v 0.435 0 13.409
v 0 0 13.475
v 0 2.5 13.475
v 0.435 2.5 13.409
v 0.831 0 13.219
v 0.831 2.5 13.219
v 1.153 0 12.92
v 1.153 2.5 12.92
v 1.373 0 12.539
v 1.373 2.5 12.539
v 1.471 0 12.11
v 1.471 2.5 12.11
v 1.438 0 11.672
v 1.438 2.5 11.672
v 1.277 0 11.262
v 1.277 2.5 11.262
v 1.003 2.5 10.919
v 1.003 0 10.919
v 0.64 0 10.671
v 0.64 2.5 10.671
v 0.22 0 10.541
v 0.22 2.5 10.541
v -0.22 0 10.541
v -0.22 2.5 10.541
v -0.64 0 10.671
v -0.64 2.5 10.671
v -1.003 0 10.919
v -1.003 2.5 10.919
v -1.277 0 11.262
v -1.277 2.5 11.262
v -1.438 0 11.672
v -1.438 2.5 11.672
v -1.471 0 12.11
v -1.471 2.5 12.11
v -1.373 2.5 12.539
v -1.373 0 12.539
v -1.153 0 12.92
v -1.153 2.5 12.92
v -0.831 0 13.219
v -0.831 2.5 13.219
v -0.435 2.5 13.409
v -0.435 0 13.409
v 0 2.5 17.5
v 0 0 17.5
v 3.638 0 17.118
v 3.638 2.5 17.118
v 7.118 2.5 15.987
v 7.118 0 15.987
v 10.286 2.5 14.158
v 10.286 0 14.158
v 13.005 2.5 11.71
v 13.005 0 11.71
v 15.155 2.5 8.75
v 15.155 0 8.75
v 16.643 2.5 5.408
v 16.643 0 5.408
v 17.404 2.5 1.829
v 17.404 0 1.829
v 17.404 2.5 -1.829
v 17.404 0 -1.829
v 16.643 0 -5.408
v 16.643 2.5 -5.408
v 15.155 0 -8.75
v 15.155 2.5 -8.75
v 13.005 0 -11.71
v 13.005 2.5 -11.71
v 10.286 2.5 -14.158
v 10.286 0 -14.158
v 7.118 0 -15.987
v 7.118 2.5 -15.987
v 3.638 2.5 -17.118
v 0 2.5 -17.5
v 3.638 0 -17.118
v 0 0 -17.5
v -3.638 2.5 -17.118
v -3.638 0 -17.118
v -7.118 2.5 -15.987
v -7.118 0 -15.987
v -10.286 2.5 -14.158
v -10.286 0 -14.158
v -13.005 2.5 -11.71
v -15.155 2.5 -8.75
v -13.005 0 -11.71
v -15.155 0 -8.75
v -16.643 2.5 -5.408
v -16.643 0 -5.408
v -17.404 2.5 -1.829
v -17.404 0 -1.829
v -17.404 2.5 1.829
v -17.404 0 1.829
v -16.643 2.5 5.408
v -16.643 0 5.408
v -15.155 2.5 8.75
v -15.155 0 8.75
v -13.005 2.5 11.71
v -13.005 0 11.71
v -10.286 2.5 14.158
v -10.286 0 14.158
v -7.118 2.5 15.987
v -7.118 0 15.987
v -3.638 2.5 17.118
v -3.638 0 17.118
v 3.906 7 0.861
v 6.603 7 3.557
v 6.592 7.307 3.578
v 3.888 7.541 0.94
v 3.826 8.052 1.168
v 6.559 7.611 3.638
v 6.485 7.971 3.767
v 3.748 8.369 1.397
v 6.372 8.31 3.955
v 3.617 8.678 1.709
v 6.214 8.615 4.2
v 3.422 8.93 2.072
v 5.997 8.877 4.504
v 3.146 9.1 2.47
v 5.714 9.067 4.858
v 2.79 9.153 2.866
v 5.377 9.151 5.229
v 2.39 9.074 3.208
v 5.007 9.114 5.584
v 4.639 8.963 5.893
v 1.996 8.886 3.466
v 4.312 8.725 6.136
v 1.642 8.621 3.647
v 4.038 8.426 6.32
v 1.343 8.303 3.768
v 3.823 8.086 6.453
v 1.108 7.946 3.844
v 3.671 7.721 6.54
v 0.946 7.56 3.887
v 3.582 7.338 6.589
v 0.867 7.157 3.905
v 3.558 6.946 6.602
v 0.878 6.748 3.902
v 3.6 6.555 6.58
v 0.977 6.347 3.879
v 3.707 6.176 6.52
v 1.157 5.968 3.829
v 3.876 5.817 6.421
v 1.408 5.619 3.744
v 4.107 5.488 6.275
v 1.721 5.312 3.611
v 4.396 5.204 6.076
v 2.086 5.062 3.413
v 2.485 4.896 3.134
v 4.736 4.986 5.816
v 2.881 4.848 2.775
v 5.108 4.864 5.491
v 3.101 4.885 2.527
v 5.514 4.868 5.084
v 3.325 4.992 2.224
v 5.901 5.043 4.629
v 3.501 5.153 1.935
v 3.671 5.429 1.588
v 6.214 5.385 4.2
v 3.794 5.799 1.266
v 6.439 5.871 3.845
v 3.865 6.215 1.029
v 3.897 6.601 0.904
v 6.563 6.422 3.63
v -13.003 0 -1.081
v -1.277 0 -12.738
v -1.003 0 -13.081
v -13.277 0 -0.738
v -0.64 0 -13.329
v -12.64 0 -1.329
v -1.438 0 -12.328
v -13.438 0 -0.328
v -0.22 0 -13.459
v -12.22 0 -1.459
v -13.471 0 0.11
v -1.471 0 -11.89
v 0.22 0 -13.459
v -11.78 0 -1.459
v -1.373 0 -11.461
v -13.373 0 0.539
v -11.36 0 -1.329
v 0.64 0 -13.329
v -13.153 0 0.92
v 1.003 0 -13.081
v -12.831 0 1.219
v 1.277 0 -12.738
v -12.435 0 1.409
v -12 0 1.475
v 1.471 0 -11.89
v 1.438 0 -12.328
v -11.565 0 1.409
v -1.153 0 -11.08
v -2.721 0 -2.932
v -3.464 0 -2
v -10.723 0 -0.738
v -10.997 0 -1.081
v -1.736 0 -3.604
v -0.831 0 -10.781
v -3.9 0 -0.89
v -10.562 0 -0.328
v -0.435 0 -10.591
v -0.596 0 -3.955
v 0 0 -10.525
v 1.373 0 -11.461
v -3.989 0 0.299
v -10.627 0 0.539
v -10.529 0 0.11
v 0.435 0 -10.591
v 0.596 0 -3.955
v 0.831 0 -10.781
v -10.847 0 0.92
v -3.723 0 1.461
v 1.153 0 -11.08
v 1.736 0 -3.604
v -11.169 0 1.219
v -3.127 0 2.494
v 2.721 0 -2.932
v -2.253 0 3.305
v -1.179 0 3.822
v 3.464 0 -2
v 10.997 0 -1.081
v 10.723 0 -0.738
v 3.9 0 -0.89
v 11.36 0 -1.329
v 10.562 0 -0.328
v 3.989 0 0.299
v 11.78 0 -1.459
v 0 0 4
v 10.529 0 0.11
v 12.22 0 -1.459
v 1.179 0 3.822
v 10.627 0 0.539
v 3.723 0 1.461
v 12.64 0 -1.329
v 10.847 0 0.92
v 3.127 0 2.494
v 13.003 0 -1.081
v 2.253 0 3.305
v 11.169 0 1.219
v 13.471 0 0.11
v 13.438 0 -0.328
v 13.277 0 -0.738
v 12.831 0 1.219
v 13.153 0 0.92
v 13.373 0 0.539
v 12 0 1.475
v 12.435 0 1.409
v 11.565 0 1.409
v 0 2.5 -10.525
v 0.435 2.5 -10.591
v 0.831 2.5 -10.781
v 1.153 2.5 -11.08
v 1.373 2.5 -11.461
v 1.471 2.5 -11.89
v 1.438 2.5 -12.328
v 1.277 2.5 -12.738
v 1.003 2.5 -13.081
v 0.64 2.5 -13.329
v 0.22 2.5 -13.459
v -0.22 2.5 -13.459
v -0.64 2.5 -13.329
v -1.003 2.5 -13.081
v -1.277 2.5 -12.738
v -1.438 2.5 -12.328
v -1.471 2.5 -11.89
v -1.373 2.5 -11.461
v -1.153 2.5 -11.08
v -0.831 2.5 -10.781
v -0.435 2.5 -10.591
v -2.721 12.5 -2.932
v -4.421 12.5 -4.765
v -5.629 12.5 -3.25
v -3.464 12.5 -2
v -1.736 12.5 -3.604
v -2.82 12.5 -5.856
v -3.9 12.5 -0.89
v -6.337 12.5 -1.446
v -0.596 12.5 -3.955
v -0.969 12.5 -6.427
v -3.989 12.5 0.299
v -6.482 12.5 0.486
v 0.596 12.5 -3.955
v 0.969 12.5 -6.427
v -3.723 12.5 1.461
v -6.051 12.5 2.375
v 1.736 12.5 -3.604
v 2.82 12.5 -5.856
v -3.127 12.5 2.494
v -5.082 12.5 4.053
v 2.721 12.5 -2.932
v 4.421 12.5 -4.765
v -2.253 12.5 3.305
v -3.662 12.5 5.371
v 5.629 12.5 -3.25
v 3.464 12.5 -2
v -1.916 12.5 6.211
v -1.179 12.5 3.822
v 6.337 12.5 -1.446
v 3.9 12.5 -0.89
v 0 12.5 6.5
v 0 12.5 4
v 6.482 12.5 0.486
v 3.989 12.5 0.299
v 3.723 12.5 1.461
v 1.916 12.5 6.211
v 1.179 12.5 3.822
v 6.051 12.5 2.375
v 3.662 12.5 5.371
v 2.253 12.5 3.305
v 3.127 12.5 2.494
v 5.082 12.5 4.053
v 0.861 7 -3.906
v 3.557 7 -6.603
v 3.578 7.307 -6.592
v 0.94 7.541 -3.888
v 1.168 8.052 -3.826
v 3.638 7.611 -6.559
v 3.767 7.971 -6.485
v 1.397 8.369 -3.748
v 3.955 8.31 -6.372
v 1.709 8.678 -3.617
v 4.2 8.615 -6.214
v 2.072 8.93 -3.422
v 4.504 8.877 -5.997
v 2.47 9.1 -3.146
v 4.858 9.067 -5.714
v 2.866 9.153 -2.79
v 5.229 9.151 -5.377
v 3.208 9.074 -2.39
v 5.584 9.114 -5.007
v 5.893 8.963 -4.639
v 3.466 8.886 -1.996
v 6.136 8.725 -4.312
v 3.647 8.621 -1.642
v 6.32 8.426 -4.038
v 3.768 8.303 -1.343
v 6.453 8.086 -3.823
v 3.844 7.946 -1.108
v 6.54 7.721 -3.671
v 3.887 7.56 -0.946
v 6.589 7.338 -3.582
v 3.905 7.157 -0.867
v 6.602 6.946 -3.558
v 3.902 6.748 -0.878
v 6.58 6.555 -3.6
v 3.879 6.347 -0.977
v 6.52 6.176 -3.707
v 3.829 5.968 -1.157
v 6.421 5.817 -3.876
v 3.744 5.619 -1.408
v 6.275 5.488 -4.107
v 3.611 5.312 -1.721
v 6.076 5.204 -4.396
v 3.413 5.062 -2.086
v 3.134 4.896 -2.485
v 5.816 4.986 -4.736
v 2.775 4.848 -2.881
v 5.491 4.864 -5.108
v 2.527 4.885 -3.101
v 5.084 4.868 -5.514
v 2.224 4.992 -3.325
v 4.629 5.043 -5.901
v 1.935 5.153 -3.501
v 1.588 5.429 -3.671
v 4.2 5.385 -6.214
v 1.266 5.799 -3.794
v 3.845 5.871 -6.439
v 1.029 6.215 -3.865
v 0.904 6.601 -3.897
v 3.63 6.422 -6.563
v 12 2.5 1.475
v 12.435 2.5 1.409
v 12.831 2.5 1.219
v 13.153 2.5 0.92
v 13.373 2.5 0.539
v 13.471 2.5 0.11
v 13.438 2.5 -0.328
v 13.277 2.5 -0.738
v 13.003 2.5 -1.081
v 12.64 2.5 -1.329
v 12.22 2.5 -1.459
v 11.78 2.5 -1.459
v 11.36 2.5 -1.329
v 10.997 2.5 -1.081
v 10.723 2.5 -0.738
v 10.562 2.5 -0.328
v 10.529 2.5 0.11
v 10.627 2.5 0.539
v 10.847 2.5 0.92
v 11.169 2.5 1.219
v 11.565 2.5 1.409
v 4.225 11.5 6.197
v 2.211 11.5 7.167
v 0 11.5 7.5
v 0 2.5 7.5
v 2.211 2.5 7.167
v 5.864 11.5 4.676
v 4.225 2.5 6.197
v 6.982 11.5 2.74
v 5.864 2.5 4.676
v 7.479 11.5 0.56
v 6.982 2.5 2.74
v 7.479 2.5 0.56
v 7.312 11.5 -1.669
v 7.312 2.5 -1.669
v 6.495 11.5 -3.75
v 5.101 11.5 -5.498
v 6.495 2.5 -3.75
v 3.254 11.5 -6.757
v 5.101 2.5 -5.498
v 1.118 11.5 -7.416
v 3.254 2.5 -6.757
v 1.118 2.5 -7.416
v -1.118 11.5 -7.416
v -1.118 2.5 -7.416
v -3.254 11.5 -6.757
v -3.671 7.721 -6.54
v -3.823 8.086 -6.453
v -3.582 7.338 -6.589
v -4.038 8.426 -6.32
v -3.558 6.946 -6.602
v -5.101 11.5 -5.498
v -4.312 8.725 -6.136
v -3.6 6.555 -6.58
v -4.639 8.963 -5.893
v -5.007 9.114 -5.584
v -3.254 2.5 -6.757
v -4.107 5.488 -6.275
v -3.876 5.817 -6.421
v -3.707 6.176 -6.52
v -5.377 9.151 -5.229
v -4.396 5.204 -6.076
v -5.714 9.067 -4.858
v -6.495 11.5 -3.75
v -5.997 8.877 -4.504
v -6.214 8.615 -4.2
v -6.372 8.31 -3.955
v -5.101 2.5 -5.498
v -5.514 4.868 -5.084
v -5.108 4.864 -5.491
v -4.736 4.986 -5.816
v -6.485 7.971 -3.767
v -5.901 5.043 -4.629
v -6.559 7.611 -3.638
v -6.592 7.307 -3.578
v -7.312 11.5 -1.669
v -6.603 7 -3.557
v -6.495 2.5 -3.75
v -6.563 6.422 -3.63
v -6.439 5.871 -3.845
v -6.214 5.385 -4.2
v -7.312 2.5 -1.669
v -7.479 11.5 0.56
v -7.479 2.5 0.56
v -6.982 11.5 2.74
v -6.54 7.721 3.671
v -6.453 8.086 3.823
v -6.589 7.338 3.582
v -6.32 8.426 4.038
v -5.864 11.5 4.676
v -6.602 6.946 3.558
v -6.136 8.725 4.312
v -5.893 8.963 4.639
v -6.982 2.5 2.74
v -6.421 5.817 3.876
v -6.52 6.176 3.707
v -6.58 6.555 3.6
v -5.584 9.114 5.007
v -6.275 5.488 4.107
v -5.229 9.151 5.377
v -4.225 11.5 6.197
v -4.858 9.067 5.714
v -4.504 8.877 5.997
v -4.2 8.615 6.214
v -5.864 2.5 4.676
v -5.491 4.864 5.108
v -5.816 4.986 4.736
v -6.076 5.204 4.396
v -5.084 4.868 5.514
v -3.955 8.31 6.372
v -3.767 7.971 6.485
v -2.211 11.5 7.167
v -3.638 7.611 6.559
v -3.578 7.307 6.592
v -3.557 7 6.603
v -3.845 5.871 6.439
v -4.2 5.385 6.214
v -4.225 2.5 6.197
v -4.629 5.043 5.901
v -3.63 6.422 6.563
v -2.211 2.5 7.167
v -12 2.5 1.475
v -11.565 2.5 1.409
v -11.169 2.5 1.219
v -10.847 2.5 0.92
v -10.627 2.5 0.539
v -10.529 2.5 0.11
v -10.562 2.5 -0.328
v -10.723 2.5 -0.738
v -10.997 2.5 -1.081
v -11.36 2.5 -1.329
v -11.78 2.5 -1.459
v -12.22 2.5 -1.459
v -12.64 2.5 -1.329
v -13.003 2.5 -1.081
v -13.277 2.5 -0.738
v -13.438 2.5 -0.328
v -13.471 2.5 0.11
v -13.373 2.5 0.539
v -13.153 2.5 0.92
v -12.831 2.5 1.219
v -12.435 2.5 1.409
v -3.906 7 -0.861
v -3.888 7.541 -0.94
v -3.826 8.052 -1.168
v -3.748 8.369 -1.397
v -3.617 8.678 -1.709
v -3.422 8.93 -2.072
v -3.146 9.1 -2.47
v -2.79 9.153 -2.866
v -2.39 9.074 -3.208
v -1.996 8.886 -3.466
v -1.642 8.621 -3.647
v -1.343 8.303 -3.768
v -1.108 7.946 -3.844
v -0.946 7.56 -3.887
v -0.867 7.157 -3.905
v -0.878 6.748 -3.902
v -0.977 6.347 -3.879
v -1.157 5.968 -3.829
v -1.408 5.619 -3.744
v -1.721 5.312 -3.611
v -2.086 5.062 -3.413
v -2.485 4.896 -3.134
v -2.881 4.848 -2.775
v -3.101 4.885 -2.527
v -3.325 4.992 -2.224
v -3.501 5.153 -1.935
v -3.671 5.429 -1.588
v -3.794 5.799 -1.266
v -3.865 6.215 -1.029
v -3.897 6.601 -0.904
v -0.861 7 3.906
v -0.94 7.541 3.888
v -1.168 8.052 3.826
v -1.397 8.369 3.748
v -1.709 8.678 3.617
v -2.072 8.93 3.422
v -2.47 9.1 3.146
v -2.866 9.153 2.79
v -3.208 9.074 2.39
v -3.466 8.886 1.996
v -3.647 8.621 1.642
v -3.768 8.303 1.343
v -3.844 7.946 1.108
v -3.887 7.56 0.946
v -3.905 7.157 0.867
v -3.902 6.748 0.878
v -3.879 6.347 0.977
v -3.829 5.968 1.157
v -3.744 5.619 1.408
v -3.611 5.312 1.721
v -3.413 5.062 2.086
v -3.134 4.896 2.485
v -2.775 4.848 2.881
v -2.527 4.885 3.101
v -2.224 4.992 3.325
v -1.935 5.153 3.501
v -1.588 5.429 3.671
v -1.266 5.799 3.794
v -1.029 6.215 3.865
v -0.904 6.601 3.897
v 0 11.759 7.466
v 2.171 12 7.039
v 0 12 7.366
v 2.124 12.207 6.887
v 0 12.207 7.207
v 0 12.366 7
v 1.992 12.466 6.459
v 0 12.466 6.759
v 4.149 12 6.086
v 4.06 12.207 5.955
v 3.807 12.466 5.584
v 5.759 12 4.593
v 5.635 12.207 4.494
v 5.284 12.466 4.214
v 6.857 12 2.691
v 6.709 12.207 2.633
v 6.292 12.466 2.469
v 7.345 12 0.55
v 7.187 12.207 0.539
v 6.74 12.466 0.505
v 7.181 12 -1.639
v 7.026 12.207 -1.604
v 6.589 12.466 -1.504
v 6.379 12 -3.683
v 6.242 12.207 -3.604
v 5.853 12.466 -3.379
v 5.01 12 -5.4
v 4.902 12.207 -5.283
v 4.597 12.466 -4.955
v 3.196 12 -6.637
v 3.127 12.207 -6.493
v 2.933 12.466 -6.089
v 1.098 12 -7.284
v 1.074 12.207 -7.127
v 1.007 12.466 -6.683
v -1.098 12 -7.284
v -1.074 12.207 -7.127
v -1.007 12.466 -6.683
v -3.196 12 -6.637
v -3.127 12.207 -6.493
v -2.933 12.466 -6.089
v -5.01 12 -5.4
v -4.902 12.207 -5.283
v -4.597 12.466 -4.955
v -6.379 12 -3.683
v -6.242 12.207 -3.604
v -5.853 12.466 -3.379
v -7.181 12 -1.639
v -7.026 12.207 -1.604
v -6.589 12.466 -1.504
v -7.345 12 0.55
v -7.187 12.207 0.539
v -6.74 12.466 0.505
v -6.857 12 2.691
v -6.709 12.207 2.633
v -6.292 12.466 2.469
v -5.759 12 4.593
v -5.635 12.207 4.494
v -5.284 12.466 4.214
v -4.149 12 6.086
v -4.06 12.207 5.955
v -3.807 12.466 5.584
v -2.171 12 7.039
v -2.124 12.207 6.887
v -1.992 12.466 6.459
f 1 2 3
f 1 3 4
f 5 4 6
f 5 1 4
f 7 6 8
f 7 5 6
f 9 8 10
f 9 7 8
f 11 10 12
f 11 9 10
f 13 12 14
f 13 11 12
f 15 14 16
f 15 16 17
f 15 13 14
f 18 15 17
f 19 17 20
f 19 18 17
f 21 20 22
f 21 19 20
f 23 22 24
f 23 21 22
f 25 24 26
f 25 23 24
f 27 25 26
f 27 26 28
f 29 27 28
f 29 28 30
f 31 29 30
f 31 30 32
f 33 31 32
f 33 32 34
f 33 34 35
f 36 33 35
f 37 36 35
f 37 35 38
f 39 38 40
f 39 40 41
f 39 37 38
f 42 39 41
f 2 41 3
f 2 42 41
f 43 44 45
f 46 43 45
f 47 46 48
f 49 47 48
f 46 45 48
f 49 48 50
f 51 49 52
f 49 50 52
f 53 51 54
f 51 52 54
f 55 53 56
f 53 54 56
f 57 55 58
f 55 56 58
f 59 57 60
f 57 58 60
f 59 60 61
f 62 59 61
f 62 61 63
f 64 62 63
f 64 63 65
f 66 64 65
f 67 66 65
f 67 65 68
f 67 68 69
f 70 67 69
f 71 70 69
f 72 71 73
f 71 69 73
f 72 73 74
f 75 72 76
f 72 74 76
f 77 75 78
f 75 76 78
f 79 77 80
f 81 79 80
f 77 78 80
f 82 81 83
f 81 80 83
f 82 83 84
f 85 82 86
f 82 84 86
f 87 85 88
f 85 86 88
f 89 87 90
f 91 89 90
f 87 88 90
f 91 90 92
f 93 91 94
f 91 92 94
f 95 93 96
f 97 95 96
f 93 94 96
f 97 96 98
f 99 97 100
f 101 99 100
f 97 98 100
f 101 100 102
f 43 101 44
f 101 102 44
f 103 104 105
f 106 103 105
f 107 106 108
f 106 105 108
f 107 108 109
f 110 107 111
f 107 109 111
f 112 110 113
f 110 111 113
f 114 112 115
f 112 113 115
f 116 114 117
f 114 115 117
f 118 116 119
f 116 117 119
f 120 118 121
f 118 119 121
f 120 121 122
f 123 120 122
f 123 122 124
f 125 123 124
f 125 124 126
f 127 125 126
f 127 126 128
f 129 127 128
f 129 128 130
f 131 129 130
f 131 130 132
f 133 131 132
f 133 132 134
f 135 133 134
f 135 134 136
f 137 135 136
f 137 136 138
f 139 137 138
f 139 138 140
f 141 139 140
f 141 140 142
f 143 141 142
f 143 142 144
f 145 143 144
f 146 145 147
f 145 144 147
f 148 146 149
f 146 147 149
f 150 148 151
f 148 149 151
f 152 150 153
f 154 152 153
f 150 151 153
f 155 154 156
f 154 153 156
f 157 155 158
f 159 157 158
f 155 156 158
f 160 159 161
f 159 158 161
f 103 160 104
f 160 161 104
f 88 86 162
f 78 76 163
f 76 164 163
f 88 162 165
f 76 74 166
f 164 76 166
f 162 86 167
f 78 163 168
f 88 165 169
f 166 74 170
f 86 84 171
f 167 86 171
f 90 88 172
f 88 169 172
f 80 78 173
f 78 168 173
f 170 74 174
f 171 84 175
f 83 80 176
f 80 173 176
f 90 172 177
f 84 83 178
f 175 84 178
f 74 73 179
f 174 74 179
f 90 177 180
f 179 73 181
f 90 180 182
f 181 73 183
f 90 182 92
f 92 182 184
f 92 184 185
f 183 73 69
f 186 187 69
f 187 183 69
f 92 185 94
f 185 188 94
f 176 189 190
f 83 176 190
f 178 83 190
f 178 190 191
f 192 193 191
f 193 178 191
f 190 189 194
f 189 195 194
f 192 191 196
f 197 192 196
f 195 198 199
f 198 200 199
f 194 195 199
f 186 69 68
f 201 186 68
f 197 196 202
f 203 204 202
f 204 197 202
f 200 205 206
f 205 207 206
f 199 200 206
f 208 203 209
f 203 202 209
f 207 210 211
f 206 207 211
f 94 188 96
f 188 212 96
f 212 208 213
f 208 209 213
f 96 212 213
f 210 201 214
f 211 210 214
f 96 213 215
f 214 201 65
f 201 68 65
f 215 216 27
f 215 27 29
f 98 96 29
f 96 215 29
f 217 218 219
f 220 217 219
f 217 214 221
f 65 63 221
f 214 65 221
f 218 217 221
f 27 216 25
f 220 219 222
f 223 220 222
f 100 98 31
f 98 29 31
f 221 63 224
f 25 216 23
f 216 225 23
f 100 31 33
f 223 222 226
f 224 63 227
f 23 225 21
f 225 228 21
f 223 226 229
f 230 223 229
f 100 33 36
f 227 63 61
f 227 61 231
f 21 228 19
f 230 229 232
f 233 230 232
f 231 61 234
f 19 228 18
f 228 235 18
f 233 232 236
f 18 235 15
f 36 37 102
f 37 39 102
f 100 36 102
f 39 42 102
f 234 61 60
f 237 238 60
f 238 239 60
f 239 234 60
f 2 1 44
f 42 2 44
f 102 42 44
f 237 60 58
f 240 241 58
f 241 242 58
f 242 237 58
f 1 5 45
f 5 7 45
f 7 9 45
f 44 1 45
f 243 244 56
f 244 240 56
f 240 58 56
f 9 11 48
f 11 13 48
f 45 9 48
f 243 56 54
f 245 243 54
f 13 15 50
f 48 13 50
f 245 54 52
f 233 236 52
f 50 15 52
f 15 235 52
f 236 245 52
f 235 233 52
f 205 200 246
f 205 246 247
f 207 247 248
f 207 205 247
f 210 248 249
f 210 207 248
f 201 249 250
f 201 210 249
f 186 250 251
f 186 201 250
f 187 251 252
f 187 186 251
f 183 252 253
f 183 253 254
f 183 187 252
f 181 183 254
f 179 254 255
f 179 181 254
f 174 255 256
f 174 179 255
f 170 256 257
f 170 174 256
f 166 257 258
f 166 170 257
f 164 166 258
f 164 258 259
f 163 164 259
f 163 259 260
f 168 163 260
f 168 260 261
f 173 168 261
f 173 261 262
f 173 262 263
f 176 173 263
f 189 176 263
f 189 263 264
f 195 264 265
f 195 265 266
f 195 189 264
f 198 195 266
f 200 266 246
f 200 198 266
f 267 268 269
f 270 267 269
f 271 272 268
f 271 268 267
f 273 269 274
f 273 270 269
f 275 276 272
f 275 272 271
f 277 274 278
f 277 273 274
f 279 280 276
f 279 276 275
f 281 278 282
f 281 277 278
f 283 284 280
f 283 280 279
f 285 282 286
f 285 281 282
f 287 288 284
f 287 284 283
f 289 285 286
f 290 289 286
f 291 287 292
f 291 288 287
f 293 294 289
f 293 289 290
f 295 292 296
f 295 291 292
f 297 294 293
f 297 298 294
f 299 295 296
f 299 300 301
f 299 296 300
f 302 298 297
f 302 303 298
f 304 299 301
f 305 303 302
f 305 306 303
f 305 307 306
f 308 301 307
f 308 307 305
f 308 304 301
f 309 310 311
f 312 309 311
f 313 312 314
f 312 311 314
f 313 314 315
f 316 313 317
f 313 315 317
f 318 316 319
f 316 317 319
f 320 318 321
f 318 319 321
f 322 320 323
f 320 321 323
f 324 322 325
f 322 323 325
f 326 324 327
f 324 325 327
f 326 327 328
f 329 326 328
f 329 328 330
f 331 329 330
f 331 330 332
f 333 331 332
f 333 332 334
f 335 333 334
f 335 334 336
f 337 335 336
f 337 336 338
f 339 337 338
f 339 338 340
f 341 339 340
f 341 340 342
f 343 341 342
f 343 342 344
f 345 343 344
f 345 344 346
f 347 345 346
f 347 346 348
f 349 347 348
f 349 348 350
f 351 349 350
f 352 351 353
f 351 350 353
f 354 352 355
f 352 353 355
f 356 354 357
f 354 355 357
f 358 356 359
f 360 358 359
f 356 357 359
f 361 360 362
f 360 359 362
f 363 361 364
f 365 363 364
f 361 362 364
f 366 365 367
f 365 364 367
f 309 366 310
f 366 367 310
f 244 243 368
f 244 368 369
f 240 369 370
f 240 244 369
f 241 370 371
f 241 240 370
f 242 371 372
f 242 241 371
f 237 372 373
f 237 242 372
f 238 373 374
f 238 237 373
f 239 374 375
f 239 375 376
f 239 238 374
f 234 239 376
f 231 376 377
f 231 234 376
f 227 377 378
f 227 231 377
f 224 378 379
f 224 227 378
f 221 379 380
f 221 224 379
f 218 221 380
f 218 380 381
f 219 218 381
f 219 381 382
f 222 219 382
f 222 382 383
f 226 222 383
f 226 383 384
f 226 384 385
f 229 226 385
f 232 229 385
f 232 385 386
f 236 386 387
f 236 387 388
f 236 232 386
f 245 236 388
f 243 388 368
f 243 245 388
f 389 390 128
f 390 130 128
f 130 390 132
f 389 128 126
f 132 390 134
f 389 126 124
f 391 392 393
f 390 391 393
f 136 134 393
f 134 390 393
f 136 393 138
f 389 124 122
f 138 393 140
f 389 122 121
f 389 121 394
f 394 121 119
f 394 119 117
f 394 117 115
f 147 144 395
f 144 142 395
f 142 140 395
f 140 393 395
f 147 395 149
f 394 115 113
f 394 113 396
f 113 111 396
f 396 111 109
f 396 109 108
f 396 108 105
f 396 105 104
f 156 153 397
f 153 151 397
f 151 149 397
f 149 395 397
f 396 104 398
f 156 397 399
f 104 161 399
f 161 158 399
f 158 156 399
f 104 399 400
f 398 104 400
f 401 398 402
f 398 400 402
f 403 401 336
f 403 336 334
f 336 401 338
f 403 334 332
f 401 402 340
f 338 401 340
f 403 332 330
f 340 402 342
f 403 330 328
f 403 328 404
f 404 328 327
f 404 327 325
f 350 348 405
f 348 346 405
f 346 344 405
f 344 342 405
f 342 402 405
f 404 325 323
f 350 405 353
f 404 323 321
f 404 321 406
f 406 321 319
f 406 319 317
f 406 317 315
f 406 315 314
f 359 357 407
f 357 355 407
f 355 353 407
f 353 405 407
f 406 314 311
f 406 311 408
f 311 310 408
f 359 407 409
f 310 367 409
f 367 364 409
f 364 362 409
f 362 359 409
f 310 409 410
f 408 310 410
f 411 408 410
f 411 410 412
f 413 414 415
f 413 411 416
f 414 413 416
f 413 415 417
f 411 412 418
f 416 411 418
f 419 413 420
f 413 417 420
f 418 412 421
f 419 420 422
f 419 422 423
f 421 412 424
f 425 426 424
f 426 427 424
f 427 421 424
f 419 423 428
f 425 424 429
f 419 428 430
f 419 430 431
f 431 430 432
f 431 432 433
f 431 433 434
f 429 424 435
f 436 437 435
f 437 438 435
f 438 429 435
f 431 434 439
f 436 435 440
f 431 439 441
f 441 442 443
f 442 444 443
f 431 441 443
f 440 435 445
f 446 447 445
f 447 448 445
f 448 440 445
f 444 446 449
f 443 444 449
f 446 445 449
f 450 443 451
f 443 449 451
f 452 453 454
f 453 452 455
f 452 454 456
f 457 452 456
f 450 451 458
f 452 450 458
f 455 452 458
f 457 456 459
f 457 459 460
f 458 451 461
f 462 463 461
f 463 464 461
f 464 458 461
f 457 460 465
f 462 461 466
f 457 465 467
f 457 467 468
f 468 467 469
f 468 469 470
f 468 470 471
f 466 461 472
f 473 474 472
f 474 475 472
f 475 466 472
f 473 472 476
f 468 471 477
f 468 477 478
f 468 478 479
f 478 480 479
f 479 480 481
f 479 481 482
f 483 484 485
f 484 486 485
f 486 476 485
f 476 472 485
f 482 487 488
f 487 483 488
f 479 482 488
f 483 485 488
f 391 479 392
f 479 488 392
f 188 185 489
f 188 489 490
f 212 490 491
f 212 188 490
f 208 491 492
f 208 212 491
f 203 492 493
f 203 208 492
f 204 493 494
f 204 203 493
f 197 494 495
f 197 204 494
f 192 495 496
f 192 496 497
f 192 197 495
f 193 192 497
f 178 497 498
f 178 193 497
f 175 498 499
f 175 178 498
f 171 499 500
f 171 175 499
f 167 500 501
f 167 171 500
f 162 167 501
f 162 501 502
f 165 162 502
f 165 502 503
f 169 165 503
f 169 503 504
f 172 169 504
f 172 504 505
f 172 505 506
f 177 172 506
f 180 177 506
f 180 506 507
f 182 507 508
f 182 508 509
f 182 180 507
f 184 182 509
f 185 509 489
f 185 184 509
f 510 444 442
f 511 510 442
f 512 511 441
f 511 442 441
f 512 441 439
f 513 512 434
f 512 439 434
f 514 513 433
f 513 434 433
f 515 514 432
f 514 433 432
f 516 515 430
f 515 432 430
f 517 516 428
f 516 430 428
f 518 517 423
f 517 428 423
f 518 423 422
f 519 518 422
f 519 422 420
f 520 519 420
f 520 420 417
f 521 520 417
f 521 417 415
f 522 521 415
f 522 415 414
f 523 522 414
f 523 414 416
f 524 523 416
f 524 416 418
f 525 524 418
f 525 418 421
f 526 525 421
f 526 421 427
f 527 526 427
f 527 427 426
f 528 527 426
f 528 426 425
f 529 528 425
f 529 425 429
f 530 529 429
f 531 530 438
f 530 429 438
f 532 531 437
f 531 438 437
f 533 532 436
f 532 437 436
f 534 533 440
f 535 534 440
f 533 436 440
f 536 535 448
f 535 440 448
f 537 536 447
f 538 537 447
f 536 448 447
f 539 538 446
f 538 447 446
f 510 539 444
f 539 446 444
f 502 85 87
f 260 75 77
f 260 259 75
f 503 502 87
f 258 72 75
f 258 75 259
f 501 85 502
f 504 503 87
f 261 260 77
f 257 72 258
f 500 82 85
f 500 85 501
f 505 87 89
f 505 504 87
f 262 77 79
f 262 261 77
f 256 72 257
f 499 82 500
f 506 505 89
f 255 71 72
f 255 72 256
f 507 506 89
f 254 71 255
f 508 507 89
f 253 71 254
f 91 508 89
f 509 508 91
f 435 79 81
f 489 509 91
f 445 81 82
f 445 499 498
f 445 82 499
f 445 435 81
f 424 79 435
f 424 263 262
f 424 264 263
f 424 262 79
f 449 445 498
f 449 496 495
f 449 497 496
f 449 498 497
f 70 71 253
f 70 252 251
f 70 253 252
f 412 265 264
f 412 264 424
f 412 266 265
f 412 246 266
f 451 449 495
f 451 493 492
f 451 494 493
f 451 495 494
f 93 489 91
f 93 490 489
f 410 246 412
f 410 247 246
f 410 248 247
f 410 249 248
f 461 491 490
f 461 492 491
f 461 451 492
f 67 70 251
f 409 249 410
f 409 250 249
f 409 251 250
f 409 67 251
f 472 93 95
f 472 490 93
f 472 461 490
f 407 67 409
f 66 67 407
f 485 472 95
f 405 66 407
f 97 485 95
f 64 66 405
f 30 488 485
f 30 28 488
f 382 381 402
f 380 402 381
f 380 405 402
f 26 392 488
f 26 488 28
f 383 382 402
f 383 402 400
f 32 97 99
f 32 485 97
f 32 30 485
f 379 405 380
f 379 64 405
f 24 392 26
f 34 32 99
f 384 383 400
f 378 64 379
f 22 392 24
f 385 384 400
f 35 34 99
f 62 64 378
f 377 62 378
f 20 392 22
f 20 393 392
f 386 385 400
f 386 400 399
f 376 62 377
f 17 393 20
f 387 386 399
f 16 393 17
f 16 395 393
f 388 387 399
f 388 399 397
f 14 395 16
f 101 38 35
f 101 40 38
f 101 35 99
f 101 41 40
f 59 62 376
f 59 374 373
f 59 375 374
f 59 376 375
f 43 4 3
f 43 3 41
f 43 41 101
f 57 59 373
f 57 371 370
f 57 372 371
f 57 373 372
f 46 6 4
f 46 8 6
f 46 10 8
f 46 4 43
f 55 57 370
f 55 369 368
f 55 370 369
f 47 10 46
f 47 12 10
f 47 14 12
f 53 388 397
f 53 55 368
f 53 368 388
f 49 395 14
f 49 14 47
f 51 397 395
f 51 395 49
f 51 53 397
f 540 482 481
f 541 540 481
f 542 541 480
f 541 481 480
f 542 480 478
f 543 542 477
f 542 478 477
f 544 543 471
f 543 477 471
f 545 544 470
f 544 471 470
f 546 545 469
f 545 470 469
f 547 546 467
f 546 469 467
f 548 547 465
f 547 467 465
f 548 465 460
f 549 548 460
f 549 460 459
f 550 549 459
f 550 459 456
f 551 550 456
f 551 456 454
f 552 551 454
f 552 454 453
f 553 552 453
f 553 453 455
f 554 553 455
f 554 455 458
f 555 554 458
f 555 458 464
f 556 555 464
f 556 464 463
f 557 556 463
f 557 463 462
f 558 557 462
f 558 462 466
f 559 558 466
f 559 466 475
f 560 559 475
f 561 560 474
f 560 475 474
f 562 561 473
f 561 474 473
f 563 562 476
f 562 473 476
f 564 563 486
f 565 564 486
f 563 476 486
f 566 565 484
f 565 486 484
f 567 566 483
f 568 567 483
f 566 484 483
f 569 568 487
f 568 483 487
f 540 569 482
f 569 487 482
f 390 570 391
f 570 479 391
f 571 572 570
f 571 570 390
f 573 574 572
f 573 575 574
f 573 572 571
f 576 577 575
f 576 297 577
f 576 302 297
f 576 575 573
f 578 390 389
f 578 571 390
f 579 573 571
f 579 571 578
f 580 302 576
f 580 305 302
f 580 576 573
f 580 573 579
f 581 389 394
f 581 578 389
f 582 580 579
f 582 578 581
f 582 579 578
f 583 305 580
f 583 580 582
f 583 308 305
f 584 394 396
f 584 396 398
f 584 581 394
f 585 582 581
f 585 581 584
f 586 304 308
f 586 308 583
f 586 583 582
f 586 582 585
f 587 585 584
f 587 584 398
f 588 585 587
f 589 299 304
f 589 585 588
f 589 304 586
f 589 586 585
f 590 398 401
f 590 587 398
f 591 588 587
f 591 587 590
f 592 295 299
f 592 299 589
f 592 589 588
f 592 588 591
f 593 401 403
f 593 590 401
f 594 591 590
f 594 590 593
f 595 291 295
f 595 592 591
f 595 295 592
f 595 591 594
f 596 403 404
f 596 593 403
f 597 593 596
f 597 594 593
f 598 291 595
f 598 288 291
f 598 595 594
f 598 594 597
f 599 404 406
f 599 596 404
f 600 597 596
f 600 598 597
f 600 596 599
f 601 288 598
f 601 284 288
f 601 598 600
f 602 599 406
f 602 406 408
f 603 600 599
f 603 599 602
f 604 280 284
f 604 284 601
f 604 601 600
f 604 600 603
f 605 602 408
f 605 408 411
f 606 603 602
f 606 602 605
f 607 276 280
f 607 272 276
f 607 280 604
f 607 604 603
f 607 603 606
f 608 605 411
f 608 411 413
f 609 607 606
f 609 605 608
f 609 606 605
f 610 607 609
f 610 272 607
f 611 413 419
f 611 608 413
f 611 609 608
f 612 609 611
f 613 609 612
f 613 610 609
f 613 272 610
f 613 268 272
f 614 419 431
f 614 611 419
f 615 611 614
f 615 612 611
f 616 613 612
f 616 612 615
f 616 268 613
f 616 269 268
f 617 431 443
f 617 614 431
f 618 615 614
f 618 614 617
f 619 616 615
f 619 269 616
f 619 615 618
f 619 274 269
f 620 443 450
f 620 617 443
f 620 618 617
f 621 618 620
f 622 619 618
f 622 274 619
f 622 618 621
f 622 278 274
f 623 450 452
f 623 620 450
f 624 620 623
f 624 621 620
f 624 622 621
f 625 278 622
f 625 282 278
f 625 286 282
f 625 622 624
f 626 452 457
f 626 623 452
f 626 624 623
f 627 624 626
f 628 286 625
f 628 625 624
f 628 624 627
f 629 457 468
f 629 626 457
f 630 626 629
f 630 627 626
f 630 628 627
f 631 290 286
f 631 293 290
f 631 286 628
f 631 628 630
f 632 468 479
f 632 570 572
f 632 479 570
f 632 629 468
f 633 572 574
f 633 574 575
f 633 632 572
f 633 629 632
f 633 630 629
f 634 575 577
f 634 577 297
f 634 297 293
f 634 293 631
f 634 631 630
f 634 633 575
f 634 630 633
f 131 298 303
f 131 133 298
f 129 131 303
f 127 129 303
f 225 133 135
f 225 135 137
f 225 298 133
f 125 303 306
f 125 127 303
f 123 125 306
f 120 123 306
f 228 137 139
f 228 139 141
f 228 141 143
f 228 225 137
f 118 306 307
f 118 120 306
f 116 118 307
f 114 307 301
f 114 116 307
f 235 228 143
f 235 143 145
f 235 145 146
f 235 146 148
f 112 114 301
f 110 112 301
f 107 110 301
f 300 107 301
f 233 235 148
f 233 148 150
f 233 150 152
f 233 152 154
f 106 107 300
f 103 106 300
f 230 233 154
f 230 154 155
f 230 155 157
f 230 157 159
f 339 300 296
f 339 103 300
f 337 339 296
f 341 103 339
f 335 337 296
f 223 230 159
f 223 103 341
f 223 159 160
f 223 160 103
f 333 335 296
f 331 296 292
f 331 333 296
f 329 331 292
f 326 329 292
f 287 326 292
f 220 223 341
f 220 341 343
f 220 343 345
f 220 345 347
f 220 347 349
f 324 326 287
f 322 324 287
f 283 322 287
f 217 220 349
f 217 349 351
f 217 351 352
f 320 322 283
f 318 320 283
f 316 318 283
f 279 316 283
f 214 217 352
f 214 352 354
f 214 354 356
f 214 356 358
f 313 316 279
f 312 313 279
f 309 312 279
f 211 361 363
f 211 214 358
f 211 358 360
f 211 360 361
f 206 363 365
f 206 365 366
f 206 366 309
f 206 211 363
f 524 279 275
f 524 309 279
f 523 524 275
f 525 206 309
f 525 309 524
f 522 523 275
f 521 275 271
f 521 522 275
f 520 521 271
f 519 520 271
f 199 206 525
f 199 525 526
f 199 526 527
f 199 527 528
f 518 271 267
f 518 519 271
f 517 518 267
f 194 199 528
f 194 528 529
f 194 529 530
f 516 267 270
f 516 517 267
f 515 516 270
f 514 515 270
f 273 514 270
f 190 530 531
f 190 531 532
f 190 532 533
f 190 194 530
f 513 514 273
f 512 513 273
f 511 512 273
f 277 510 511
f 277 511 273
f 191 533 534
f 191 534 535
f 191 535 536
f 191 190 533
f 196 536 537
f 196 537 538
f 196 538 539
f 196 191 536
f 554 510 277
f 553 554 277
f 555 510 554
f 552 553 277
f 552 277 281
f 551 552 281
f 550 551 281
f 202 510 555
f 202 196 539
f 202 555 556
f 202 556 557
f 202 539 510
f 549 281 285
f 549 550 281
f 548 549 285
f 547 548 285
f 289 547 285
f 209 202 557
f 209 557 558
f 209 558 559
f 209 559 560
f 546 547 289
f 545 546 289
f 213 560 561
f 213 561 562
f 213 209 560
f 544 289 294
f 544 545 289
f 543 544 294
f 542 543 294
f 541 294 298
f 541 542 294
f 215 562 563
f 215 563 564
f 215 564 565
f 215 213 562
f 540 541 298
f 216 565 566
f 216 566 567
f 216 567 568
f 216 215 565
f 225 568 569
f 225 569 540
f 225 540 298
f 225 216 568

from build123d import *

# Parameters (mm, degrees)
SKETCH2_R           = 17.5
SKETCH2_R_2         = 1.475
SKETCH2_R_3         = 4
BOSS_EXTRUDE1_DEPTH = 2.5
SKETCH3_R           = 7.5
SKETCH3_R_2         = 4
BOSS_EXTRUDE2_DEPTH = 10
FILLET1_R           = 1
SKETCH7_R           = 2.153442821
CUT_EXTRUDE7_DEPTH  = 5
CIRPATTERN2_COUNT   = 4


with BuildPart() as part:
    # Sketch2 → Boss-Extrude1 (new body)
    with BuildSketch(Plane(origin=(0, 0, 0), x_dir=(1, 0, 0), z_dir=(0, 1, 0))):
        with Locations(Location((0, 0, 0), (0, 0, 270))):
            Circle(SKETCH2_R)
        with Locations(Location((-12, 0, 0), (0, 0, 270))):
            Circle(SKETCH2_R_2, mode=Mode.SUBTRACT)
        with Locations(Location((0, -12, 0), (0, 0, 270))):
            Circle(SKETCH2_R_2, mode=Mode.SUBTRACT)
        with Locations(Location((12, 0, 0), (0, 0, 270))):
            Circle(SKETCH2_R_2, mode=Mode.SUBTRACT)
        with Locations(Location((0, 12, 0), (0, 0, 270))):
            Circle(SKETCH2_R_2, mode=Mode.SUBTRACT)
        with Locations(Location((0, 0, 0), (0, 0, 270))):
            Circle(SKETCH2_R_3, mode=Mode.SUBTRACT)
    extrude(amount=BOSS_EXTRUDE1_DEPTH)

    # Sketch3 → Boss-Extrude2 (add)
    with BuildSketch(Plane(origin=(0, 2.5, 0), x_dir=(1, 0, 0), z_dir=(0, 1, 0))):
        with Locations(Location((0, 0, 0), (0, 0, 270))):
            Circle(SKETCH3_R)
        with Locations(Location((0, 0, 0), (0, 0, 270))):
            Circle(SKETCH3_R_2, mode=Mode.SUBTRACT)
    extrude(amount=BOSS_EXTRUDE2_DEPTH)

    # Fillet1
    fillet1_edges = [part.edges().sort_by_distance(p)[0] for p in [
        (0, 12.5, -7.5),
    ]]
    fillet(fillet1_edges, radius=FILLET1_R)

    # Sketch7 → Cut-Extrude7 (cut)
    with BuildSketch(Plane(origin=(5.303300859, 0, 5.303300859), x_dir=(0, -1, 0), z_dir=(0.7071067811865464, 0, 0.7071067811865488))):
        with Locations(Location((-7, 0, 0), (0, 0, 90))):
            Circle(SKETCH7_R)
    cut_extrude7 = extrude(amount=-CUT_EXTRUDE7_DEPTH, mode=Mode.SUBTRACT)

    # CirPattern2: Cut-Extrude7 ×4 about axis
    cirpattern2_axis = Axis((0, 12.5, 0), (0, -1, 0))
    for i in range(1, CIRPATTERN2_COUNT):
        add(cut_extrude7.rotate(cirpattern2_axis, i * 360 / CIRPATTERN2_COUNT), mode=Mode.SUBTRACT)


solid = part.part
